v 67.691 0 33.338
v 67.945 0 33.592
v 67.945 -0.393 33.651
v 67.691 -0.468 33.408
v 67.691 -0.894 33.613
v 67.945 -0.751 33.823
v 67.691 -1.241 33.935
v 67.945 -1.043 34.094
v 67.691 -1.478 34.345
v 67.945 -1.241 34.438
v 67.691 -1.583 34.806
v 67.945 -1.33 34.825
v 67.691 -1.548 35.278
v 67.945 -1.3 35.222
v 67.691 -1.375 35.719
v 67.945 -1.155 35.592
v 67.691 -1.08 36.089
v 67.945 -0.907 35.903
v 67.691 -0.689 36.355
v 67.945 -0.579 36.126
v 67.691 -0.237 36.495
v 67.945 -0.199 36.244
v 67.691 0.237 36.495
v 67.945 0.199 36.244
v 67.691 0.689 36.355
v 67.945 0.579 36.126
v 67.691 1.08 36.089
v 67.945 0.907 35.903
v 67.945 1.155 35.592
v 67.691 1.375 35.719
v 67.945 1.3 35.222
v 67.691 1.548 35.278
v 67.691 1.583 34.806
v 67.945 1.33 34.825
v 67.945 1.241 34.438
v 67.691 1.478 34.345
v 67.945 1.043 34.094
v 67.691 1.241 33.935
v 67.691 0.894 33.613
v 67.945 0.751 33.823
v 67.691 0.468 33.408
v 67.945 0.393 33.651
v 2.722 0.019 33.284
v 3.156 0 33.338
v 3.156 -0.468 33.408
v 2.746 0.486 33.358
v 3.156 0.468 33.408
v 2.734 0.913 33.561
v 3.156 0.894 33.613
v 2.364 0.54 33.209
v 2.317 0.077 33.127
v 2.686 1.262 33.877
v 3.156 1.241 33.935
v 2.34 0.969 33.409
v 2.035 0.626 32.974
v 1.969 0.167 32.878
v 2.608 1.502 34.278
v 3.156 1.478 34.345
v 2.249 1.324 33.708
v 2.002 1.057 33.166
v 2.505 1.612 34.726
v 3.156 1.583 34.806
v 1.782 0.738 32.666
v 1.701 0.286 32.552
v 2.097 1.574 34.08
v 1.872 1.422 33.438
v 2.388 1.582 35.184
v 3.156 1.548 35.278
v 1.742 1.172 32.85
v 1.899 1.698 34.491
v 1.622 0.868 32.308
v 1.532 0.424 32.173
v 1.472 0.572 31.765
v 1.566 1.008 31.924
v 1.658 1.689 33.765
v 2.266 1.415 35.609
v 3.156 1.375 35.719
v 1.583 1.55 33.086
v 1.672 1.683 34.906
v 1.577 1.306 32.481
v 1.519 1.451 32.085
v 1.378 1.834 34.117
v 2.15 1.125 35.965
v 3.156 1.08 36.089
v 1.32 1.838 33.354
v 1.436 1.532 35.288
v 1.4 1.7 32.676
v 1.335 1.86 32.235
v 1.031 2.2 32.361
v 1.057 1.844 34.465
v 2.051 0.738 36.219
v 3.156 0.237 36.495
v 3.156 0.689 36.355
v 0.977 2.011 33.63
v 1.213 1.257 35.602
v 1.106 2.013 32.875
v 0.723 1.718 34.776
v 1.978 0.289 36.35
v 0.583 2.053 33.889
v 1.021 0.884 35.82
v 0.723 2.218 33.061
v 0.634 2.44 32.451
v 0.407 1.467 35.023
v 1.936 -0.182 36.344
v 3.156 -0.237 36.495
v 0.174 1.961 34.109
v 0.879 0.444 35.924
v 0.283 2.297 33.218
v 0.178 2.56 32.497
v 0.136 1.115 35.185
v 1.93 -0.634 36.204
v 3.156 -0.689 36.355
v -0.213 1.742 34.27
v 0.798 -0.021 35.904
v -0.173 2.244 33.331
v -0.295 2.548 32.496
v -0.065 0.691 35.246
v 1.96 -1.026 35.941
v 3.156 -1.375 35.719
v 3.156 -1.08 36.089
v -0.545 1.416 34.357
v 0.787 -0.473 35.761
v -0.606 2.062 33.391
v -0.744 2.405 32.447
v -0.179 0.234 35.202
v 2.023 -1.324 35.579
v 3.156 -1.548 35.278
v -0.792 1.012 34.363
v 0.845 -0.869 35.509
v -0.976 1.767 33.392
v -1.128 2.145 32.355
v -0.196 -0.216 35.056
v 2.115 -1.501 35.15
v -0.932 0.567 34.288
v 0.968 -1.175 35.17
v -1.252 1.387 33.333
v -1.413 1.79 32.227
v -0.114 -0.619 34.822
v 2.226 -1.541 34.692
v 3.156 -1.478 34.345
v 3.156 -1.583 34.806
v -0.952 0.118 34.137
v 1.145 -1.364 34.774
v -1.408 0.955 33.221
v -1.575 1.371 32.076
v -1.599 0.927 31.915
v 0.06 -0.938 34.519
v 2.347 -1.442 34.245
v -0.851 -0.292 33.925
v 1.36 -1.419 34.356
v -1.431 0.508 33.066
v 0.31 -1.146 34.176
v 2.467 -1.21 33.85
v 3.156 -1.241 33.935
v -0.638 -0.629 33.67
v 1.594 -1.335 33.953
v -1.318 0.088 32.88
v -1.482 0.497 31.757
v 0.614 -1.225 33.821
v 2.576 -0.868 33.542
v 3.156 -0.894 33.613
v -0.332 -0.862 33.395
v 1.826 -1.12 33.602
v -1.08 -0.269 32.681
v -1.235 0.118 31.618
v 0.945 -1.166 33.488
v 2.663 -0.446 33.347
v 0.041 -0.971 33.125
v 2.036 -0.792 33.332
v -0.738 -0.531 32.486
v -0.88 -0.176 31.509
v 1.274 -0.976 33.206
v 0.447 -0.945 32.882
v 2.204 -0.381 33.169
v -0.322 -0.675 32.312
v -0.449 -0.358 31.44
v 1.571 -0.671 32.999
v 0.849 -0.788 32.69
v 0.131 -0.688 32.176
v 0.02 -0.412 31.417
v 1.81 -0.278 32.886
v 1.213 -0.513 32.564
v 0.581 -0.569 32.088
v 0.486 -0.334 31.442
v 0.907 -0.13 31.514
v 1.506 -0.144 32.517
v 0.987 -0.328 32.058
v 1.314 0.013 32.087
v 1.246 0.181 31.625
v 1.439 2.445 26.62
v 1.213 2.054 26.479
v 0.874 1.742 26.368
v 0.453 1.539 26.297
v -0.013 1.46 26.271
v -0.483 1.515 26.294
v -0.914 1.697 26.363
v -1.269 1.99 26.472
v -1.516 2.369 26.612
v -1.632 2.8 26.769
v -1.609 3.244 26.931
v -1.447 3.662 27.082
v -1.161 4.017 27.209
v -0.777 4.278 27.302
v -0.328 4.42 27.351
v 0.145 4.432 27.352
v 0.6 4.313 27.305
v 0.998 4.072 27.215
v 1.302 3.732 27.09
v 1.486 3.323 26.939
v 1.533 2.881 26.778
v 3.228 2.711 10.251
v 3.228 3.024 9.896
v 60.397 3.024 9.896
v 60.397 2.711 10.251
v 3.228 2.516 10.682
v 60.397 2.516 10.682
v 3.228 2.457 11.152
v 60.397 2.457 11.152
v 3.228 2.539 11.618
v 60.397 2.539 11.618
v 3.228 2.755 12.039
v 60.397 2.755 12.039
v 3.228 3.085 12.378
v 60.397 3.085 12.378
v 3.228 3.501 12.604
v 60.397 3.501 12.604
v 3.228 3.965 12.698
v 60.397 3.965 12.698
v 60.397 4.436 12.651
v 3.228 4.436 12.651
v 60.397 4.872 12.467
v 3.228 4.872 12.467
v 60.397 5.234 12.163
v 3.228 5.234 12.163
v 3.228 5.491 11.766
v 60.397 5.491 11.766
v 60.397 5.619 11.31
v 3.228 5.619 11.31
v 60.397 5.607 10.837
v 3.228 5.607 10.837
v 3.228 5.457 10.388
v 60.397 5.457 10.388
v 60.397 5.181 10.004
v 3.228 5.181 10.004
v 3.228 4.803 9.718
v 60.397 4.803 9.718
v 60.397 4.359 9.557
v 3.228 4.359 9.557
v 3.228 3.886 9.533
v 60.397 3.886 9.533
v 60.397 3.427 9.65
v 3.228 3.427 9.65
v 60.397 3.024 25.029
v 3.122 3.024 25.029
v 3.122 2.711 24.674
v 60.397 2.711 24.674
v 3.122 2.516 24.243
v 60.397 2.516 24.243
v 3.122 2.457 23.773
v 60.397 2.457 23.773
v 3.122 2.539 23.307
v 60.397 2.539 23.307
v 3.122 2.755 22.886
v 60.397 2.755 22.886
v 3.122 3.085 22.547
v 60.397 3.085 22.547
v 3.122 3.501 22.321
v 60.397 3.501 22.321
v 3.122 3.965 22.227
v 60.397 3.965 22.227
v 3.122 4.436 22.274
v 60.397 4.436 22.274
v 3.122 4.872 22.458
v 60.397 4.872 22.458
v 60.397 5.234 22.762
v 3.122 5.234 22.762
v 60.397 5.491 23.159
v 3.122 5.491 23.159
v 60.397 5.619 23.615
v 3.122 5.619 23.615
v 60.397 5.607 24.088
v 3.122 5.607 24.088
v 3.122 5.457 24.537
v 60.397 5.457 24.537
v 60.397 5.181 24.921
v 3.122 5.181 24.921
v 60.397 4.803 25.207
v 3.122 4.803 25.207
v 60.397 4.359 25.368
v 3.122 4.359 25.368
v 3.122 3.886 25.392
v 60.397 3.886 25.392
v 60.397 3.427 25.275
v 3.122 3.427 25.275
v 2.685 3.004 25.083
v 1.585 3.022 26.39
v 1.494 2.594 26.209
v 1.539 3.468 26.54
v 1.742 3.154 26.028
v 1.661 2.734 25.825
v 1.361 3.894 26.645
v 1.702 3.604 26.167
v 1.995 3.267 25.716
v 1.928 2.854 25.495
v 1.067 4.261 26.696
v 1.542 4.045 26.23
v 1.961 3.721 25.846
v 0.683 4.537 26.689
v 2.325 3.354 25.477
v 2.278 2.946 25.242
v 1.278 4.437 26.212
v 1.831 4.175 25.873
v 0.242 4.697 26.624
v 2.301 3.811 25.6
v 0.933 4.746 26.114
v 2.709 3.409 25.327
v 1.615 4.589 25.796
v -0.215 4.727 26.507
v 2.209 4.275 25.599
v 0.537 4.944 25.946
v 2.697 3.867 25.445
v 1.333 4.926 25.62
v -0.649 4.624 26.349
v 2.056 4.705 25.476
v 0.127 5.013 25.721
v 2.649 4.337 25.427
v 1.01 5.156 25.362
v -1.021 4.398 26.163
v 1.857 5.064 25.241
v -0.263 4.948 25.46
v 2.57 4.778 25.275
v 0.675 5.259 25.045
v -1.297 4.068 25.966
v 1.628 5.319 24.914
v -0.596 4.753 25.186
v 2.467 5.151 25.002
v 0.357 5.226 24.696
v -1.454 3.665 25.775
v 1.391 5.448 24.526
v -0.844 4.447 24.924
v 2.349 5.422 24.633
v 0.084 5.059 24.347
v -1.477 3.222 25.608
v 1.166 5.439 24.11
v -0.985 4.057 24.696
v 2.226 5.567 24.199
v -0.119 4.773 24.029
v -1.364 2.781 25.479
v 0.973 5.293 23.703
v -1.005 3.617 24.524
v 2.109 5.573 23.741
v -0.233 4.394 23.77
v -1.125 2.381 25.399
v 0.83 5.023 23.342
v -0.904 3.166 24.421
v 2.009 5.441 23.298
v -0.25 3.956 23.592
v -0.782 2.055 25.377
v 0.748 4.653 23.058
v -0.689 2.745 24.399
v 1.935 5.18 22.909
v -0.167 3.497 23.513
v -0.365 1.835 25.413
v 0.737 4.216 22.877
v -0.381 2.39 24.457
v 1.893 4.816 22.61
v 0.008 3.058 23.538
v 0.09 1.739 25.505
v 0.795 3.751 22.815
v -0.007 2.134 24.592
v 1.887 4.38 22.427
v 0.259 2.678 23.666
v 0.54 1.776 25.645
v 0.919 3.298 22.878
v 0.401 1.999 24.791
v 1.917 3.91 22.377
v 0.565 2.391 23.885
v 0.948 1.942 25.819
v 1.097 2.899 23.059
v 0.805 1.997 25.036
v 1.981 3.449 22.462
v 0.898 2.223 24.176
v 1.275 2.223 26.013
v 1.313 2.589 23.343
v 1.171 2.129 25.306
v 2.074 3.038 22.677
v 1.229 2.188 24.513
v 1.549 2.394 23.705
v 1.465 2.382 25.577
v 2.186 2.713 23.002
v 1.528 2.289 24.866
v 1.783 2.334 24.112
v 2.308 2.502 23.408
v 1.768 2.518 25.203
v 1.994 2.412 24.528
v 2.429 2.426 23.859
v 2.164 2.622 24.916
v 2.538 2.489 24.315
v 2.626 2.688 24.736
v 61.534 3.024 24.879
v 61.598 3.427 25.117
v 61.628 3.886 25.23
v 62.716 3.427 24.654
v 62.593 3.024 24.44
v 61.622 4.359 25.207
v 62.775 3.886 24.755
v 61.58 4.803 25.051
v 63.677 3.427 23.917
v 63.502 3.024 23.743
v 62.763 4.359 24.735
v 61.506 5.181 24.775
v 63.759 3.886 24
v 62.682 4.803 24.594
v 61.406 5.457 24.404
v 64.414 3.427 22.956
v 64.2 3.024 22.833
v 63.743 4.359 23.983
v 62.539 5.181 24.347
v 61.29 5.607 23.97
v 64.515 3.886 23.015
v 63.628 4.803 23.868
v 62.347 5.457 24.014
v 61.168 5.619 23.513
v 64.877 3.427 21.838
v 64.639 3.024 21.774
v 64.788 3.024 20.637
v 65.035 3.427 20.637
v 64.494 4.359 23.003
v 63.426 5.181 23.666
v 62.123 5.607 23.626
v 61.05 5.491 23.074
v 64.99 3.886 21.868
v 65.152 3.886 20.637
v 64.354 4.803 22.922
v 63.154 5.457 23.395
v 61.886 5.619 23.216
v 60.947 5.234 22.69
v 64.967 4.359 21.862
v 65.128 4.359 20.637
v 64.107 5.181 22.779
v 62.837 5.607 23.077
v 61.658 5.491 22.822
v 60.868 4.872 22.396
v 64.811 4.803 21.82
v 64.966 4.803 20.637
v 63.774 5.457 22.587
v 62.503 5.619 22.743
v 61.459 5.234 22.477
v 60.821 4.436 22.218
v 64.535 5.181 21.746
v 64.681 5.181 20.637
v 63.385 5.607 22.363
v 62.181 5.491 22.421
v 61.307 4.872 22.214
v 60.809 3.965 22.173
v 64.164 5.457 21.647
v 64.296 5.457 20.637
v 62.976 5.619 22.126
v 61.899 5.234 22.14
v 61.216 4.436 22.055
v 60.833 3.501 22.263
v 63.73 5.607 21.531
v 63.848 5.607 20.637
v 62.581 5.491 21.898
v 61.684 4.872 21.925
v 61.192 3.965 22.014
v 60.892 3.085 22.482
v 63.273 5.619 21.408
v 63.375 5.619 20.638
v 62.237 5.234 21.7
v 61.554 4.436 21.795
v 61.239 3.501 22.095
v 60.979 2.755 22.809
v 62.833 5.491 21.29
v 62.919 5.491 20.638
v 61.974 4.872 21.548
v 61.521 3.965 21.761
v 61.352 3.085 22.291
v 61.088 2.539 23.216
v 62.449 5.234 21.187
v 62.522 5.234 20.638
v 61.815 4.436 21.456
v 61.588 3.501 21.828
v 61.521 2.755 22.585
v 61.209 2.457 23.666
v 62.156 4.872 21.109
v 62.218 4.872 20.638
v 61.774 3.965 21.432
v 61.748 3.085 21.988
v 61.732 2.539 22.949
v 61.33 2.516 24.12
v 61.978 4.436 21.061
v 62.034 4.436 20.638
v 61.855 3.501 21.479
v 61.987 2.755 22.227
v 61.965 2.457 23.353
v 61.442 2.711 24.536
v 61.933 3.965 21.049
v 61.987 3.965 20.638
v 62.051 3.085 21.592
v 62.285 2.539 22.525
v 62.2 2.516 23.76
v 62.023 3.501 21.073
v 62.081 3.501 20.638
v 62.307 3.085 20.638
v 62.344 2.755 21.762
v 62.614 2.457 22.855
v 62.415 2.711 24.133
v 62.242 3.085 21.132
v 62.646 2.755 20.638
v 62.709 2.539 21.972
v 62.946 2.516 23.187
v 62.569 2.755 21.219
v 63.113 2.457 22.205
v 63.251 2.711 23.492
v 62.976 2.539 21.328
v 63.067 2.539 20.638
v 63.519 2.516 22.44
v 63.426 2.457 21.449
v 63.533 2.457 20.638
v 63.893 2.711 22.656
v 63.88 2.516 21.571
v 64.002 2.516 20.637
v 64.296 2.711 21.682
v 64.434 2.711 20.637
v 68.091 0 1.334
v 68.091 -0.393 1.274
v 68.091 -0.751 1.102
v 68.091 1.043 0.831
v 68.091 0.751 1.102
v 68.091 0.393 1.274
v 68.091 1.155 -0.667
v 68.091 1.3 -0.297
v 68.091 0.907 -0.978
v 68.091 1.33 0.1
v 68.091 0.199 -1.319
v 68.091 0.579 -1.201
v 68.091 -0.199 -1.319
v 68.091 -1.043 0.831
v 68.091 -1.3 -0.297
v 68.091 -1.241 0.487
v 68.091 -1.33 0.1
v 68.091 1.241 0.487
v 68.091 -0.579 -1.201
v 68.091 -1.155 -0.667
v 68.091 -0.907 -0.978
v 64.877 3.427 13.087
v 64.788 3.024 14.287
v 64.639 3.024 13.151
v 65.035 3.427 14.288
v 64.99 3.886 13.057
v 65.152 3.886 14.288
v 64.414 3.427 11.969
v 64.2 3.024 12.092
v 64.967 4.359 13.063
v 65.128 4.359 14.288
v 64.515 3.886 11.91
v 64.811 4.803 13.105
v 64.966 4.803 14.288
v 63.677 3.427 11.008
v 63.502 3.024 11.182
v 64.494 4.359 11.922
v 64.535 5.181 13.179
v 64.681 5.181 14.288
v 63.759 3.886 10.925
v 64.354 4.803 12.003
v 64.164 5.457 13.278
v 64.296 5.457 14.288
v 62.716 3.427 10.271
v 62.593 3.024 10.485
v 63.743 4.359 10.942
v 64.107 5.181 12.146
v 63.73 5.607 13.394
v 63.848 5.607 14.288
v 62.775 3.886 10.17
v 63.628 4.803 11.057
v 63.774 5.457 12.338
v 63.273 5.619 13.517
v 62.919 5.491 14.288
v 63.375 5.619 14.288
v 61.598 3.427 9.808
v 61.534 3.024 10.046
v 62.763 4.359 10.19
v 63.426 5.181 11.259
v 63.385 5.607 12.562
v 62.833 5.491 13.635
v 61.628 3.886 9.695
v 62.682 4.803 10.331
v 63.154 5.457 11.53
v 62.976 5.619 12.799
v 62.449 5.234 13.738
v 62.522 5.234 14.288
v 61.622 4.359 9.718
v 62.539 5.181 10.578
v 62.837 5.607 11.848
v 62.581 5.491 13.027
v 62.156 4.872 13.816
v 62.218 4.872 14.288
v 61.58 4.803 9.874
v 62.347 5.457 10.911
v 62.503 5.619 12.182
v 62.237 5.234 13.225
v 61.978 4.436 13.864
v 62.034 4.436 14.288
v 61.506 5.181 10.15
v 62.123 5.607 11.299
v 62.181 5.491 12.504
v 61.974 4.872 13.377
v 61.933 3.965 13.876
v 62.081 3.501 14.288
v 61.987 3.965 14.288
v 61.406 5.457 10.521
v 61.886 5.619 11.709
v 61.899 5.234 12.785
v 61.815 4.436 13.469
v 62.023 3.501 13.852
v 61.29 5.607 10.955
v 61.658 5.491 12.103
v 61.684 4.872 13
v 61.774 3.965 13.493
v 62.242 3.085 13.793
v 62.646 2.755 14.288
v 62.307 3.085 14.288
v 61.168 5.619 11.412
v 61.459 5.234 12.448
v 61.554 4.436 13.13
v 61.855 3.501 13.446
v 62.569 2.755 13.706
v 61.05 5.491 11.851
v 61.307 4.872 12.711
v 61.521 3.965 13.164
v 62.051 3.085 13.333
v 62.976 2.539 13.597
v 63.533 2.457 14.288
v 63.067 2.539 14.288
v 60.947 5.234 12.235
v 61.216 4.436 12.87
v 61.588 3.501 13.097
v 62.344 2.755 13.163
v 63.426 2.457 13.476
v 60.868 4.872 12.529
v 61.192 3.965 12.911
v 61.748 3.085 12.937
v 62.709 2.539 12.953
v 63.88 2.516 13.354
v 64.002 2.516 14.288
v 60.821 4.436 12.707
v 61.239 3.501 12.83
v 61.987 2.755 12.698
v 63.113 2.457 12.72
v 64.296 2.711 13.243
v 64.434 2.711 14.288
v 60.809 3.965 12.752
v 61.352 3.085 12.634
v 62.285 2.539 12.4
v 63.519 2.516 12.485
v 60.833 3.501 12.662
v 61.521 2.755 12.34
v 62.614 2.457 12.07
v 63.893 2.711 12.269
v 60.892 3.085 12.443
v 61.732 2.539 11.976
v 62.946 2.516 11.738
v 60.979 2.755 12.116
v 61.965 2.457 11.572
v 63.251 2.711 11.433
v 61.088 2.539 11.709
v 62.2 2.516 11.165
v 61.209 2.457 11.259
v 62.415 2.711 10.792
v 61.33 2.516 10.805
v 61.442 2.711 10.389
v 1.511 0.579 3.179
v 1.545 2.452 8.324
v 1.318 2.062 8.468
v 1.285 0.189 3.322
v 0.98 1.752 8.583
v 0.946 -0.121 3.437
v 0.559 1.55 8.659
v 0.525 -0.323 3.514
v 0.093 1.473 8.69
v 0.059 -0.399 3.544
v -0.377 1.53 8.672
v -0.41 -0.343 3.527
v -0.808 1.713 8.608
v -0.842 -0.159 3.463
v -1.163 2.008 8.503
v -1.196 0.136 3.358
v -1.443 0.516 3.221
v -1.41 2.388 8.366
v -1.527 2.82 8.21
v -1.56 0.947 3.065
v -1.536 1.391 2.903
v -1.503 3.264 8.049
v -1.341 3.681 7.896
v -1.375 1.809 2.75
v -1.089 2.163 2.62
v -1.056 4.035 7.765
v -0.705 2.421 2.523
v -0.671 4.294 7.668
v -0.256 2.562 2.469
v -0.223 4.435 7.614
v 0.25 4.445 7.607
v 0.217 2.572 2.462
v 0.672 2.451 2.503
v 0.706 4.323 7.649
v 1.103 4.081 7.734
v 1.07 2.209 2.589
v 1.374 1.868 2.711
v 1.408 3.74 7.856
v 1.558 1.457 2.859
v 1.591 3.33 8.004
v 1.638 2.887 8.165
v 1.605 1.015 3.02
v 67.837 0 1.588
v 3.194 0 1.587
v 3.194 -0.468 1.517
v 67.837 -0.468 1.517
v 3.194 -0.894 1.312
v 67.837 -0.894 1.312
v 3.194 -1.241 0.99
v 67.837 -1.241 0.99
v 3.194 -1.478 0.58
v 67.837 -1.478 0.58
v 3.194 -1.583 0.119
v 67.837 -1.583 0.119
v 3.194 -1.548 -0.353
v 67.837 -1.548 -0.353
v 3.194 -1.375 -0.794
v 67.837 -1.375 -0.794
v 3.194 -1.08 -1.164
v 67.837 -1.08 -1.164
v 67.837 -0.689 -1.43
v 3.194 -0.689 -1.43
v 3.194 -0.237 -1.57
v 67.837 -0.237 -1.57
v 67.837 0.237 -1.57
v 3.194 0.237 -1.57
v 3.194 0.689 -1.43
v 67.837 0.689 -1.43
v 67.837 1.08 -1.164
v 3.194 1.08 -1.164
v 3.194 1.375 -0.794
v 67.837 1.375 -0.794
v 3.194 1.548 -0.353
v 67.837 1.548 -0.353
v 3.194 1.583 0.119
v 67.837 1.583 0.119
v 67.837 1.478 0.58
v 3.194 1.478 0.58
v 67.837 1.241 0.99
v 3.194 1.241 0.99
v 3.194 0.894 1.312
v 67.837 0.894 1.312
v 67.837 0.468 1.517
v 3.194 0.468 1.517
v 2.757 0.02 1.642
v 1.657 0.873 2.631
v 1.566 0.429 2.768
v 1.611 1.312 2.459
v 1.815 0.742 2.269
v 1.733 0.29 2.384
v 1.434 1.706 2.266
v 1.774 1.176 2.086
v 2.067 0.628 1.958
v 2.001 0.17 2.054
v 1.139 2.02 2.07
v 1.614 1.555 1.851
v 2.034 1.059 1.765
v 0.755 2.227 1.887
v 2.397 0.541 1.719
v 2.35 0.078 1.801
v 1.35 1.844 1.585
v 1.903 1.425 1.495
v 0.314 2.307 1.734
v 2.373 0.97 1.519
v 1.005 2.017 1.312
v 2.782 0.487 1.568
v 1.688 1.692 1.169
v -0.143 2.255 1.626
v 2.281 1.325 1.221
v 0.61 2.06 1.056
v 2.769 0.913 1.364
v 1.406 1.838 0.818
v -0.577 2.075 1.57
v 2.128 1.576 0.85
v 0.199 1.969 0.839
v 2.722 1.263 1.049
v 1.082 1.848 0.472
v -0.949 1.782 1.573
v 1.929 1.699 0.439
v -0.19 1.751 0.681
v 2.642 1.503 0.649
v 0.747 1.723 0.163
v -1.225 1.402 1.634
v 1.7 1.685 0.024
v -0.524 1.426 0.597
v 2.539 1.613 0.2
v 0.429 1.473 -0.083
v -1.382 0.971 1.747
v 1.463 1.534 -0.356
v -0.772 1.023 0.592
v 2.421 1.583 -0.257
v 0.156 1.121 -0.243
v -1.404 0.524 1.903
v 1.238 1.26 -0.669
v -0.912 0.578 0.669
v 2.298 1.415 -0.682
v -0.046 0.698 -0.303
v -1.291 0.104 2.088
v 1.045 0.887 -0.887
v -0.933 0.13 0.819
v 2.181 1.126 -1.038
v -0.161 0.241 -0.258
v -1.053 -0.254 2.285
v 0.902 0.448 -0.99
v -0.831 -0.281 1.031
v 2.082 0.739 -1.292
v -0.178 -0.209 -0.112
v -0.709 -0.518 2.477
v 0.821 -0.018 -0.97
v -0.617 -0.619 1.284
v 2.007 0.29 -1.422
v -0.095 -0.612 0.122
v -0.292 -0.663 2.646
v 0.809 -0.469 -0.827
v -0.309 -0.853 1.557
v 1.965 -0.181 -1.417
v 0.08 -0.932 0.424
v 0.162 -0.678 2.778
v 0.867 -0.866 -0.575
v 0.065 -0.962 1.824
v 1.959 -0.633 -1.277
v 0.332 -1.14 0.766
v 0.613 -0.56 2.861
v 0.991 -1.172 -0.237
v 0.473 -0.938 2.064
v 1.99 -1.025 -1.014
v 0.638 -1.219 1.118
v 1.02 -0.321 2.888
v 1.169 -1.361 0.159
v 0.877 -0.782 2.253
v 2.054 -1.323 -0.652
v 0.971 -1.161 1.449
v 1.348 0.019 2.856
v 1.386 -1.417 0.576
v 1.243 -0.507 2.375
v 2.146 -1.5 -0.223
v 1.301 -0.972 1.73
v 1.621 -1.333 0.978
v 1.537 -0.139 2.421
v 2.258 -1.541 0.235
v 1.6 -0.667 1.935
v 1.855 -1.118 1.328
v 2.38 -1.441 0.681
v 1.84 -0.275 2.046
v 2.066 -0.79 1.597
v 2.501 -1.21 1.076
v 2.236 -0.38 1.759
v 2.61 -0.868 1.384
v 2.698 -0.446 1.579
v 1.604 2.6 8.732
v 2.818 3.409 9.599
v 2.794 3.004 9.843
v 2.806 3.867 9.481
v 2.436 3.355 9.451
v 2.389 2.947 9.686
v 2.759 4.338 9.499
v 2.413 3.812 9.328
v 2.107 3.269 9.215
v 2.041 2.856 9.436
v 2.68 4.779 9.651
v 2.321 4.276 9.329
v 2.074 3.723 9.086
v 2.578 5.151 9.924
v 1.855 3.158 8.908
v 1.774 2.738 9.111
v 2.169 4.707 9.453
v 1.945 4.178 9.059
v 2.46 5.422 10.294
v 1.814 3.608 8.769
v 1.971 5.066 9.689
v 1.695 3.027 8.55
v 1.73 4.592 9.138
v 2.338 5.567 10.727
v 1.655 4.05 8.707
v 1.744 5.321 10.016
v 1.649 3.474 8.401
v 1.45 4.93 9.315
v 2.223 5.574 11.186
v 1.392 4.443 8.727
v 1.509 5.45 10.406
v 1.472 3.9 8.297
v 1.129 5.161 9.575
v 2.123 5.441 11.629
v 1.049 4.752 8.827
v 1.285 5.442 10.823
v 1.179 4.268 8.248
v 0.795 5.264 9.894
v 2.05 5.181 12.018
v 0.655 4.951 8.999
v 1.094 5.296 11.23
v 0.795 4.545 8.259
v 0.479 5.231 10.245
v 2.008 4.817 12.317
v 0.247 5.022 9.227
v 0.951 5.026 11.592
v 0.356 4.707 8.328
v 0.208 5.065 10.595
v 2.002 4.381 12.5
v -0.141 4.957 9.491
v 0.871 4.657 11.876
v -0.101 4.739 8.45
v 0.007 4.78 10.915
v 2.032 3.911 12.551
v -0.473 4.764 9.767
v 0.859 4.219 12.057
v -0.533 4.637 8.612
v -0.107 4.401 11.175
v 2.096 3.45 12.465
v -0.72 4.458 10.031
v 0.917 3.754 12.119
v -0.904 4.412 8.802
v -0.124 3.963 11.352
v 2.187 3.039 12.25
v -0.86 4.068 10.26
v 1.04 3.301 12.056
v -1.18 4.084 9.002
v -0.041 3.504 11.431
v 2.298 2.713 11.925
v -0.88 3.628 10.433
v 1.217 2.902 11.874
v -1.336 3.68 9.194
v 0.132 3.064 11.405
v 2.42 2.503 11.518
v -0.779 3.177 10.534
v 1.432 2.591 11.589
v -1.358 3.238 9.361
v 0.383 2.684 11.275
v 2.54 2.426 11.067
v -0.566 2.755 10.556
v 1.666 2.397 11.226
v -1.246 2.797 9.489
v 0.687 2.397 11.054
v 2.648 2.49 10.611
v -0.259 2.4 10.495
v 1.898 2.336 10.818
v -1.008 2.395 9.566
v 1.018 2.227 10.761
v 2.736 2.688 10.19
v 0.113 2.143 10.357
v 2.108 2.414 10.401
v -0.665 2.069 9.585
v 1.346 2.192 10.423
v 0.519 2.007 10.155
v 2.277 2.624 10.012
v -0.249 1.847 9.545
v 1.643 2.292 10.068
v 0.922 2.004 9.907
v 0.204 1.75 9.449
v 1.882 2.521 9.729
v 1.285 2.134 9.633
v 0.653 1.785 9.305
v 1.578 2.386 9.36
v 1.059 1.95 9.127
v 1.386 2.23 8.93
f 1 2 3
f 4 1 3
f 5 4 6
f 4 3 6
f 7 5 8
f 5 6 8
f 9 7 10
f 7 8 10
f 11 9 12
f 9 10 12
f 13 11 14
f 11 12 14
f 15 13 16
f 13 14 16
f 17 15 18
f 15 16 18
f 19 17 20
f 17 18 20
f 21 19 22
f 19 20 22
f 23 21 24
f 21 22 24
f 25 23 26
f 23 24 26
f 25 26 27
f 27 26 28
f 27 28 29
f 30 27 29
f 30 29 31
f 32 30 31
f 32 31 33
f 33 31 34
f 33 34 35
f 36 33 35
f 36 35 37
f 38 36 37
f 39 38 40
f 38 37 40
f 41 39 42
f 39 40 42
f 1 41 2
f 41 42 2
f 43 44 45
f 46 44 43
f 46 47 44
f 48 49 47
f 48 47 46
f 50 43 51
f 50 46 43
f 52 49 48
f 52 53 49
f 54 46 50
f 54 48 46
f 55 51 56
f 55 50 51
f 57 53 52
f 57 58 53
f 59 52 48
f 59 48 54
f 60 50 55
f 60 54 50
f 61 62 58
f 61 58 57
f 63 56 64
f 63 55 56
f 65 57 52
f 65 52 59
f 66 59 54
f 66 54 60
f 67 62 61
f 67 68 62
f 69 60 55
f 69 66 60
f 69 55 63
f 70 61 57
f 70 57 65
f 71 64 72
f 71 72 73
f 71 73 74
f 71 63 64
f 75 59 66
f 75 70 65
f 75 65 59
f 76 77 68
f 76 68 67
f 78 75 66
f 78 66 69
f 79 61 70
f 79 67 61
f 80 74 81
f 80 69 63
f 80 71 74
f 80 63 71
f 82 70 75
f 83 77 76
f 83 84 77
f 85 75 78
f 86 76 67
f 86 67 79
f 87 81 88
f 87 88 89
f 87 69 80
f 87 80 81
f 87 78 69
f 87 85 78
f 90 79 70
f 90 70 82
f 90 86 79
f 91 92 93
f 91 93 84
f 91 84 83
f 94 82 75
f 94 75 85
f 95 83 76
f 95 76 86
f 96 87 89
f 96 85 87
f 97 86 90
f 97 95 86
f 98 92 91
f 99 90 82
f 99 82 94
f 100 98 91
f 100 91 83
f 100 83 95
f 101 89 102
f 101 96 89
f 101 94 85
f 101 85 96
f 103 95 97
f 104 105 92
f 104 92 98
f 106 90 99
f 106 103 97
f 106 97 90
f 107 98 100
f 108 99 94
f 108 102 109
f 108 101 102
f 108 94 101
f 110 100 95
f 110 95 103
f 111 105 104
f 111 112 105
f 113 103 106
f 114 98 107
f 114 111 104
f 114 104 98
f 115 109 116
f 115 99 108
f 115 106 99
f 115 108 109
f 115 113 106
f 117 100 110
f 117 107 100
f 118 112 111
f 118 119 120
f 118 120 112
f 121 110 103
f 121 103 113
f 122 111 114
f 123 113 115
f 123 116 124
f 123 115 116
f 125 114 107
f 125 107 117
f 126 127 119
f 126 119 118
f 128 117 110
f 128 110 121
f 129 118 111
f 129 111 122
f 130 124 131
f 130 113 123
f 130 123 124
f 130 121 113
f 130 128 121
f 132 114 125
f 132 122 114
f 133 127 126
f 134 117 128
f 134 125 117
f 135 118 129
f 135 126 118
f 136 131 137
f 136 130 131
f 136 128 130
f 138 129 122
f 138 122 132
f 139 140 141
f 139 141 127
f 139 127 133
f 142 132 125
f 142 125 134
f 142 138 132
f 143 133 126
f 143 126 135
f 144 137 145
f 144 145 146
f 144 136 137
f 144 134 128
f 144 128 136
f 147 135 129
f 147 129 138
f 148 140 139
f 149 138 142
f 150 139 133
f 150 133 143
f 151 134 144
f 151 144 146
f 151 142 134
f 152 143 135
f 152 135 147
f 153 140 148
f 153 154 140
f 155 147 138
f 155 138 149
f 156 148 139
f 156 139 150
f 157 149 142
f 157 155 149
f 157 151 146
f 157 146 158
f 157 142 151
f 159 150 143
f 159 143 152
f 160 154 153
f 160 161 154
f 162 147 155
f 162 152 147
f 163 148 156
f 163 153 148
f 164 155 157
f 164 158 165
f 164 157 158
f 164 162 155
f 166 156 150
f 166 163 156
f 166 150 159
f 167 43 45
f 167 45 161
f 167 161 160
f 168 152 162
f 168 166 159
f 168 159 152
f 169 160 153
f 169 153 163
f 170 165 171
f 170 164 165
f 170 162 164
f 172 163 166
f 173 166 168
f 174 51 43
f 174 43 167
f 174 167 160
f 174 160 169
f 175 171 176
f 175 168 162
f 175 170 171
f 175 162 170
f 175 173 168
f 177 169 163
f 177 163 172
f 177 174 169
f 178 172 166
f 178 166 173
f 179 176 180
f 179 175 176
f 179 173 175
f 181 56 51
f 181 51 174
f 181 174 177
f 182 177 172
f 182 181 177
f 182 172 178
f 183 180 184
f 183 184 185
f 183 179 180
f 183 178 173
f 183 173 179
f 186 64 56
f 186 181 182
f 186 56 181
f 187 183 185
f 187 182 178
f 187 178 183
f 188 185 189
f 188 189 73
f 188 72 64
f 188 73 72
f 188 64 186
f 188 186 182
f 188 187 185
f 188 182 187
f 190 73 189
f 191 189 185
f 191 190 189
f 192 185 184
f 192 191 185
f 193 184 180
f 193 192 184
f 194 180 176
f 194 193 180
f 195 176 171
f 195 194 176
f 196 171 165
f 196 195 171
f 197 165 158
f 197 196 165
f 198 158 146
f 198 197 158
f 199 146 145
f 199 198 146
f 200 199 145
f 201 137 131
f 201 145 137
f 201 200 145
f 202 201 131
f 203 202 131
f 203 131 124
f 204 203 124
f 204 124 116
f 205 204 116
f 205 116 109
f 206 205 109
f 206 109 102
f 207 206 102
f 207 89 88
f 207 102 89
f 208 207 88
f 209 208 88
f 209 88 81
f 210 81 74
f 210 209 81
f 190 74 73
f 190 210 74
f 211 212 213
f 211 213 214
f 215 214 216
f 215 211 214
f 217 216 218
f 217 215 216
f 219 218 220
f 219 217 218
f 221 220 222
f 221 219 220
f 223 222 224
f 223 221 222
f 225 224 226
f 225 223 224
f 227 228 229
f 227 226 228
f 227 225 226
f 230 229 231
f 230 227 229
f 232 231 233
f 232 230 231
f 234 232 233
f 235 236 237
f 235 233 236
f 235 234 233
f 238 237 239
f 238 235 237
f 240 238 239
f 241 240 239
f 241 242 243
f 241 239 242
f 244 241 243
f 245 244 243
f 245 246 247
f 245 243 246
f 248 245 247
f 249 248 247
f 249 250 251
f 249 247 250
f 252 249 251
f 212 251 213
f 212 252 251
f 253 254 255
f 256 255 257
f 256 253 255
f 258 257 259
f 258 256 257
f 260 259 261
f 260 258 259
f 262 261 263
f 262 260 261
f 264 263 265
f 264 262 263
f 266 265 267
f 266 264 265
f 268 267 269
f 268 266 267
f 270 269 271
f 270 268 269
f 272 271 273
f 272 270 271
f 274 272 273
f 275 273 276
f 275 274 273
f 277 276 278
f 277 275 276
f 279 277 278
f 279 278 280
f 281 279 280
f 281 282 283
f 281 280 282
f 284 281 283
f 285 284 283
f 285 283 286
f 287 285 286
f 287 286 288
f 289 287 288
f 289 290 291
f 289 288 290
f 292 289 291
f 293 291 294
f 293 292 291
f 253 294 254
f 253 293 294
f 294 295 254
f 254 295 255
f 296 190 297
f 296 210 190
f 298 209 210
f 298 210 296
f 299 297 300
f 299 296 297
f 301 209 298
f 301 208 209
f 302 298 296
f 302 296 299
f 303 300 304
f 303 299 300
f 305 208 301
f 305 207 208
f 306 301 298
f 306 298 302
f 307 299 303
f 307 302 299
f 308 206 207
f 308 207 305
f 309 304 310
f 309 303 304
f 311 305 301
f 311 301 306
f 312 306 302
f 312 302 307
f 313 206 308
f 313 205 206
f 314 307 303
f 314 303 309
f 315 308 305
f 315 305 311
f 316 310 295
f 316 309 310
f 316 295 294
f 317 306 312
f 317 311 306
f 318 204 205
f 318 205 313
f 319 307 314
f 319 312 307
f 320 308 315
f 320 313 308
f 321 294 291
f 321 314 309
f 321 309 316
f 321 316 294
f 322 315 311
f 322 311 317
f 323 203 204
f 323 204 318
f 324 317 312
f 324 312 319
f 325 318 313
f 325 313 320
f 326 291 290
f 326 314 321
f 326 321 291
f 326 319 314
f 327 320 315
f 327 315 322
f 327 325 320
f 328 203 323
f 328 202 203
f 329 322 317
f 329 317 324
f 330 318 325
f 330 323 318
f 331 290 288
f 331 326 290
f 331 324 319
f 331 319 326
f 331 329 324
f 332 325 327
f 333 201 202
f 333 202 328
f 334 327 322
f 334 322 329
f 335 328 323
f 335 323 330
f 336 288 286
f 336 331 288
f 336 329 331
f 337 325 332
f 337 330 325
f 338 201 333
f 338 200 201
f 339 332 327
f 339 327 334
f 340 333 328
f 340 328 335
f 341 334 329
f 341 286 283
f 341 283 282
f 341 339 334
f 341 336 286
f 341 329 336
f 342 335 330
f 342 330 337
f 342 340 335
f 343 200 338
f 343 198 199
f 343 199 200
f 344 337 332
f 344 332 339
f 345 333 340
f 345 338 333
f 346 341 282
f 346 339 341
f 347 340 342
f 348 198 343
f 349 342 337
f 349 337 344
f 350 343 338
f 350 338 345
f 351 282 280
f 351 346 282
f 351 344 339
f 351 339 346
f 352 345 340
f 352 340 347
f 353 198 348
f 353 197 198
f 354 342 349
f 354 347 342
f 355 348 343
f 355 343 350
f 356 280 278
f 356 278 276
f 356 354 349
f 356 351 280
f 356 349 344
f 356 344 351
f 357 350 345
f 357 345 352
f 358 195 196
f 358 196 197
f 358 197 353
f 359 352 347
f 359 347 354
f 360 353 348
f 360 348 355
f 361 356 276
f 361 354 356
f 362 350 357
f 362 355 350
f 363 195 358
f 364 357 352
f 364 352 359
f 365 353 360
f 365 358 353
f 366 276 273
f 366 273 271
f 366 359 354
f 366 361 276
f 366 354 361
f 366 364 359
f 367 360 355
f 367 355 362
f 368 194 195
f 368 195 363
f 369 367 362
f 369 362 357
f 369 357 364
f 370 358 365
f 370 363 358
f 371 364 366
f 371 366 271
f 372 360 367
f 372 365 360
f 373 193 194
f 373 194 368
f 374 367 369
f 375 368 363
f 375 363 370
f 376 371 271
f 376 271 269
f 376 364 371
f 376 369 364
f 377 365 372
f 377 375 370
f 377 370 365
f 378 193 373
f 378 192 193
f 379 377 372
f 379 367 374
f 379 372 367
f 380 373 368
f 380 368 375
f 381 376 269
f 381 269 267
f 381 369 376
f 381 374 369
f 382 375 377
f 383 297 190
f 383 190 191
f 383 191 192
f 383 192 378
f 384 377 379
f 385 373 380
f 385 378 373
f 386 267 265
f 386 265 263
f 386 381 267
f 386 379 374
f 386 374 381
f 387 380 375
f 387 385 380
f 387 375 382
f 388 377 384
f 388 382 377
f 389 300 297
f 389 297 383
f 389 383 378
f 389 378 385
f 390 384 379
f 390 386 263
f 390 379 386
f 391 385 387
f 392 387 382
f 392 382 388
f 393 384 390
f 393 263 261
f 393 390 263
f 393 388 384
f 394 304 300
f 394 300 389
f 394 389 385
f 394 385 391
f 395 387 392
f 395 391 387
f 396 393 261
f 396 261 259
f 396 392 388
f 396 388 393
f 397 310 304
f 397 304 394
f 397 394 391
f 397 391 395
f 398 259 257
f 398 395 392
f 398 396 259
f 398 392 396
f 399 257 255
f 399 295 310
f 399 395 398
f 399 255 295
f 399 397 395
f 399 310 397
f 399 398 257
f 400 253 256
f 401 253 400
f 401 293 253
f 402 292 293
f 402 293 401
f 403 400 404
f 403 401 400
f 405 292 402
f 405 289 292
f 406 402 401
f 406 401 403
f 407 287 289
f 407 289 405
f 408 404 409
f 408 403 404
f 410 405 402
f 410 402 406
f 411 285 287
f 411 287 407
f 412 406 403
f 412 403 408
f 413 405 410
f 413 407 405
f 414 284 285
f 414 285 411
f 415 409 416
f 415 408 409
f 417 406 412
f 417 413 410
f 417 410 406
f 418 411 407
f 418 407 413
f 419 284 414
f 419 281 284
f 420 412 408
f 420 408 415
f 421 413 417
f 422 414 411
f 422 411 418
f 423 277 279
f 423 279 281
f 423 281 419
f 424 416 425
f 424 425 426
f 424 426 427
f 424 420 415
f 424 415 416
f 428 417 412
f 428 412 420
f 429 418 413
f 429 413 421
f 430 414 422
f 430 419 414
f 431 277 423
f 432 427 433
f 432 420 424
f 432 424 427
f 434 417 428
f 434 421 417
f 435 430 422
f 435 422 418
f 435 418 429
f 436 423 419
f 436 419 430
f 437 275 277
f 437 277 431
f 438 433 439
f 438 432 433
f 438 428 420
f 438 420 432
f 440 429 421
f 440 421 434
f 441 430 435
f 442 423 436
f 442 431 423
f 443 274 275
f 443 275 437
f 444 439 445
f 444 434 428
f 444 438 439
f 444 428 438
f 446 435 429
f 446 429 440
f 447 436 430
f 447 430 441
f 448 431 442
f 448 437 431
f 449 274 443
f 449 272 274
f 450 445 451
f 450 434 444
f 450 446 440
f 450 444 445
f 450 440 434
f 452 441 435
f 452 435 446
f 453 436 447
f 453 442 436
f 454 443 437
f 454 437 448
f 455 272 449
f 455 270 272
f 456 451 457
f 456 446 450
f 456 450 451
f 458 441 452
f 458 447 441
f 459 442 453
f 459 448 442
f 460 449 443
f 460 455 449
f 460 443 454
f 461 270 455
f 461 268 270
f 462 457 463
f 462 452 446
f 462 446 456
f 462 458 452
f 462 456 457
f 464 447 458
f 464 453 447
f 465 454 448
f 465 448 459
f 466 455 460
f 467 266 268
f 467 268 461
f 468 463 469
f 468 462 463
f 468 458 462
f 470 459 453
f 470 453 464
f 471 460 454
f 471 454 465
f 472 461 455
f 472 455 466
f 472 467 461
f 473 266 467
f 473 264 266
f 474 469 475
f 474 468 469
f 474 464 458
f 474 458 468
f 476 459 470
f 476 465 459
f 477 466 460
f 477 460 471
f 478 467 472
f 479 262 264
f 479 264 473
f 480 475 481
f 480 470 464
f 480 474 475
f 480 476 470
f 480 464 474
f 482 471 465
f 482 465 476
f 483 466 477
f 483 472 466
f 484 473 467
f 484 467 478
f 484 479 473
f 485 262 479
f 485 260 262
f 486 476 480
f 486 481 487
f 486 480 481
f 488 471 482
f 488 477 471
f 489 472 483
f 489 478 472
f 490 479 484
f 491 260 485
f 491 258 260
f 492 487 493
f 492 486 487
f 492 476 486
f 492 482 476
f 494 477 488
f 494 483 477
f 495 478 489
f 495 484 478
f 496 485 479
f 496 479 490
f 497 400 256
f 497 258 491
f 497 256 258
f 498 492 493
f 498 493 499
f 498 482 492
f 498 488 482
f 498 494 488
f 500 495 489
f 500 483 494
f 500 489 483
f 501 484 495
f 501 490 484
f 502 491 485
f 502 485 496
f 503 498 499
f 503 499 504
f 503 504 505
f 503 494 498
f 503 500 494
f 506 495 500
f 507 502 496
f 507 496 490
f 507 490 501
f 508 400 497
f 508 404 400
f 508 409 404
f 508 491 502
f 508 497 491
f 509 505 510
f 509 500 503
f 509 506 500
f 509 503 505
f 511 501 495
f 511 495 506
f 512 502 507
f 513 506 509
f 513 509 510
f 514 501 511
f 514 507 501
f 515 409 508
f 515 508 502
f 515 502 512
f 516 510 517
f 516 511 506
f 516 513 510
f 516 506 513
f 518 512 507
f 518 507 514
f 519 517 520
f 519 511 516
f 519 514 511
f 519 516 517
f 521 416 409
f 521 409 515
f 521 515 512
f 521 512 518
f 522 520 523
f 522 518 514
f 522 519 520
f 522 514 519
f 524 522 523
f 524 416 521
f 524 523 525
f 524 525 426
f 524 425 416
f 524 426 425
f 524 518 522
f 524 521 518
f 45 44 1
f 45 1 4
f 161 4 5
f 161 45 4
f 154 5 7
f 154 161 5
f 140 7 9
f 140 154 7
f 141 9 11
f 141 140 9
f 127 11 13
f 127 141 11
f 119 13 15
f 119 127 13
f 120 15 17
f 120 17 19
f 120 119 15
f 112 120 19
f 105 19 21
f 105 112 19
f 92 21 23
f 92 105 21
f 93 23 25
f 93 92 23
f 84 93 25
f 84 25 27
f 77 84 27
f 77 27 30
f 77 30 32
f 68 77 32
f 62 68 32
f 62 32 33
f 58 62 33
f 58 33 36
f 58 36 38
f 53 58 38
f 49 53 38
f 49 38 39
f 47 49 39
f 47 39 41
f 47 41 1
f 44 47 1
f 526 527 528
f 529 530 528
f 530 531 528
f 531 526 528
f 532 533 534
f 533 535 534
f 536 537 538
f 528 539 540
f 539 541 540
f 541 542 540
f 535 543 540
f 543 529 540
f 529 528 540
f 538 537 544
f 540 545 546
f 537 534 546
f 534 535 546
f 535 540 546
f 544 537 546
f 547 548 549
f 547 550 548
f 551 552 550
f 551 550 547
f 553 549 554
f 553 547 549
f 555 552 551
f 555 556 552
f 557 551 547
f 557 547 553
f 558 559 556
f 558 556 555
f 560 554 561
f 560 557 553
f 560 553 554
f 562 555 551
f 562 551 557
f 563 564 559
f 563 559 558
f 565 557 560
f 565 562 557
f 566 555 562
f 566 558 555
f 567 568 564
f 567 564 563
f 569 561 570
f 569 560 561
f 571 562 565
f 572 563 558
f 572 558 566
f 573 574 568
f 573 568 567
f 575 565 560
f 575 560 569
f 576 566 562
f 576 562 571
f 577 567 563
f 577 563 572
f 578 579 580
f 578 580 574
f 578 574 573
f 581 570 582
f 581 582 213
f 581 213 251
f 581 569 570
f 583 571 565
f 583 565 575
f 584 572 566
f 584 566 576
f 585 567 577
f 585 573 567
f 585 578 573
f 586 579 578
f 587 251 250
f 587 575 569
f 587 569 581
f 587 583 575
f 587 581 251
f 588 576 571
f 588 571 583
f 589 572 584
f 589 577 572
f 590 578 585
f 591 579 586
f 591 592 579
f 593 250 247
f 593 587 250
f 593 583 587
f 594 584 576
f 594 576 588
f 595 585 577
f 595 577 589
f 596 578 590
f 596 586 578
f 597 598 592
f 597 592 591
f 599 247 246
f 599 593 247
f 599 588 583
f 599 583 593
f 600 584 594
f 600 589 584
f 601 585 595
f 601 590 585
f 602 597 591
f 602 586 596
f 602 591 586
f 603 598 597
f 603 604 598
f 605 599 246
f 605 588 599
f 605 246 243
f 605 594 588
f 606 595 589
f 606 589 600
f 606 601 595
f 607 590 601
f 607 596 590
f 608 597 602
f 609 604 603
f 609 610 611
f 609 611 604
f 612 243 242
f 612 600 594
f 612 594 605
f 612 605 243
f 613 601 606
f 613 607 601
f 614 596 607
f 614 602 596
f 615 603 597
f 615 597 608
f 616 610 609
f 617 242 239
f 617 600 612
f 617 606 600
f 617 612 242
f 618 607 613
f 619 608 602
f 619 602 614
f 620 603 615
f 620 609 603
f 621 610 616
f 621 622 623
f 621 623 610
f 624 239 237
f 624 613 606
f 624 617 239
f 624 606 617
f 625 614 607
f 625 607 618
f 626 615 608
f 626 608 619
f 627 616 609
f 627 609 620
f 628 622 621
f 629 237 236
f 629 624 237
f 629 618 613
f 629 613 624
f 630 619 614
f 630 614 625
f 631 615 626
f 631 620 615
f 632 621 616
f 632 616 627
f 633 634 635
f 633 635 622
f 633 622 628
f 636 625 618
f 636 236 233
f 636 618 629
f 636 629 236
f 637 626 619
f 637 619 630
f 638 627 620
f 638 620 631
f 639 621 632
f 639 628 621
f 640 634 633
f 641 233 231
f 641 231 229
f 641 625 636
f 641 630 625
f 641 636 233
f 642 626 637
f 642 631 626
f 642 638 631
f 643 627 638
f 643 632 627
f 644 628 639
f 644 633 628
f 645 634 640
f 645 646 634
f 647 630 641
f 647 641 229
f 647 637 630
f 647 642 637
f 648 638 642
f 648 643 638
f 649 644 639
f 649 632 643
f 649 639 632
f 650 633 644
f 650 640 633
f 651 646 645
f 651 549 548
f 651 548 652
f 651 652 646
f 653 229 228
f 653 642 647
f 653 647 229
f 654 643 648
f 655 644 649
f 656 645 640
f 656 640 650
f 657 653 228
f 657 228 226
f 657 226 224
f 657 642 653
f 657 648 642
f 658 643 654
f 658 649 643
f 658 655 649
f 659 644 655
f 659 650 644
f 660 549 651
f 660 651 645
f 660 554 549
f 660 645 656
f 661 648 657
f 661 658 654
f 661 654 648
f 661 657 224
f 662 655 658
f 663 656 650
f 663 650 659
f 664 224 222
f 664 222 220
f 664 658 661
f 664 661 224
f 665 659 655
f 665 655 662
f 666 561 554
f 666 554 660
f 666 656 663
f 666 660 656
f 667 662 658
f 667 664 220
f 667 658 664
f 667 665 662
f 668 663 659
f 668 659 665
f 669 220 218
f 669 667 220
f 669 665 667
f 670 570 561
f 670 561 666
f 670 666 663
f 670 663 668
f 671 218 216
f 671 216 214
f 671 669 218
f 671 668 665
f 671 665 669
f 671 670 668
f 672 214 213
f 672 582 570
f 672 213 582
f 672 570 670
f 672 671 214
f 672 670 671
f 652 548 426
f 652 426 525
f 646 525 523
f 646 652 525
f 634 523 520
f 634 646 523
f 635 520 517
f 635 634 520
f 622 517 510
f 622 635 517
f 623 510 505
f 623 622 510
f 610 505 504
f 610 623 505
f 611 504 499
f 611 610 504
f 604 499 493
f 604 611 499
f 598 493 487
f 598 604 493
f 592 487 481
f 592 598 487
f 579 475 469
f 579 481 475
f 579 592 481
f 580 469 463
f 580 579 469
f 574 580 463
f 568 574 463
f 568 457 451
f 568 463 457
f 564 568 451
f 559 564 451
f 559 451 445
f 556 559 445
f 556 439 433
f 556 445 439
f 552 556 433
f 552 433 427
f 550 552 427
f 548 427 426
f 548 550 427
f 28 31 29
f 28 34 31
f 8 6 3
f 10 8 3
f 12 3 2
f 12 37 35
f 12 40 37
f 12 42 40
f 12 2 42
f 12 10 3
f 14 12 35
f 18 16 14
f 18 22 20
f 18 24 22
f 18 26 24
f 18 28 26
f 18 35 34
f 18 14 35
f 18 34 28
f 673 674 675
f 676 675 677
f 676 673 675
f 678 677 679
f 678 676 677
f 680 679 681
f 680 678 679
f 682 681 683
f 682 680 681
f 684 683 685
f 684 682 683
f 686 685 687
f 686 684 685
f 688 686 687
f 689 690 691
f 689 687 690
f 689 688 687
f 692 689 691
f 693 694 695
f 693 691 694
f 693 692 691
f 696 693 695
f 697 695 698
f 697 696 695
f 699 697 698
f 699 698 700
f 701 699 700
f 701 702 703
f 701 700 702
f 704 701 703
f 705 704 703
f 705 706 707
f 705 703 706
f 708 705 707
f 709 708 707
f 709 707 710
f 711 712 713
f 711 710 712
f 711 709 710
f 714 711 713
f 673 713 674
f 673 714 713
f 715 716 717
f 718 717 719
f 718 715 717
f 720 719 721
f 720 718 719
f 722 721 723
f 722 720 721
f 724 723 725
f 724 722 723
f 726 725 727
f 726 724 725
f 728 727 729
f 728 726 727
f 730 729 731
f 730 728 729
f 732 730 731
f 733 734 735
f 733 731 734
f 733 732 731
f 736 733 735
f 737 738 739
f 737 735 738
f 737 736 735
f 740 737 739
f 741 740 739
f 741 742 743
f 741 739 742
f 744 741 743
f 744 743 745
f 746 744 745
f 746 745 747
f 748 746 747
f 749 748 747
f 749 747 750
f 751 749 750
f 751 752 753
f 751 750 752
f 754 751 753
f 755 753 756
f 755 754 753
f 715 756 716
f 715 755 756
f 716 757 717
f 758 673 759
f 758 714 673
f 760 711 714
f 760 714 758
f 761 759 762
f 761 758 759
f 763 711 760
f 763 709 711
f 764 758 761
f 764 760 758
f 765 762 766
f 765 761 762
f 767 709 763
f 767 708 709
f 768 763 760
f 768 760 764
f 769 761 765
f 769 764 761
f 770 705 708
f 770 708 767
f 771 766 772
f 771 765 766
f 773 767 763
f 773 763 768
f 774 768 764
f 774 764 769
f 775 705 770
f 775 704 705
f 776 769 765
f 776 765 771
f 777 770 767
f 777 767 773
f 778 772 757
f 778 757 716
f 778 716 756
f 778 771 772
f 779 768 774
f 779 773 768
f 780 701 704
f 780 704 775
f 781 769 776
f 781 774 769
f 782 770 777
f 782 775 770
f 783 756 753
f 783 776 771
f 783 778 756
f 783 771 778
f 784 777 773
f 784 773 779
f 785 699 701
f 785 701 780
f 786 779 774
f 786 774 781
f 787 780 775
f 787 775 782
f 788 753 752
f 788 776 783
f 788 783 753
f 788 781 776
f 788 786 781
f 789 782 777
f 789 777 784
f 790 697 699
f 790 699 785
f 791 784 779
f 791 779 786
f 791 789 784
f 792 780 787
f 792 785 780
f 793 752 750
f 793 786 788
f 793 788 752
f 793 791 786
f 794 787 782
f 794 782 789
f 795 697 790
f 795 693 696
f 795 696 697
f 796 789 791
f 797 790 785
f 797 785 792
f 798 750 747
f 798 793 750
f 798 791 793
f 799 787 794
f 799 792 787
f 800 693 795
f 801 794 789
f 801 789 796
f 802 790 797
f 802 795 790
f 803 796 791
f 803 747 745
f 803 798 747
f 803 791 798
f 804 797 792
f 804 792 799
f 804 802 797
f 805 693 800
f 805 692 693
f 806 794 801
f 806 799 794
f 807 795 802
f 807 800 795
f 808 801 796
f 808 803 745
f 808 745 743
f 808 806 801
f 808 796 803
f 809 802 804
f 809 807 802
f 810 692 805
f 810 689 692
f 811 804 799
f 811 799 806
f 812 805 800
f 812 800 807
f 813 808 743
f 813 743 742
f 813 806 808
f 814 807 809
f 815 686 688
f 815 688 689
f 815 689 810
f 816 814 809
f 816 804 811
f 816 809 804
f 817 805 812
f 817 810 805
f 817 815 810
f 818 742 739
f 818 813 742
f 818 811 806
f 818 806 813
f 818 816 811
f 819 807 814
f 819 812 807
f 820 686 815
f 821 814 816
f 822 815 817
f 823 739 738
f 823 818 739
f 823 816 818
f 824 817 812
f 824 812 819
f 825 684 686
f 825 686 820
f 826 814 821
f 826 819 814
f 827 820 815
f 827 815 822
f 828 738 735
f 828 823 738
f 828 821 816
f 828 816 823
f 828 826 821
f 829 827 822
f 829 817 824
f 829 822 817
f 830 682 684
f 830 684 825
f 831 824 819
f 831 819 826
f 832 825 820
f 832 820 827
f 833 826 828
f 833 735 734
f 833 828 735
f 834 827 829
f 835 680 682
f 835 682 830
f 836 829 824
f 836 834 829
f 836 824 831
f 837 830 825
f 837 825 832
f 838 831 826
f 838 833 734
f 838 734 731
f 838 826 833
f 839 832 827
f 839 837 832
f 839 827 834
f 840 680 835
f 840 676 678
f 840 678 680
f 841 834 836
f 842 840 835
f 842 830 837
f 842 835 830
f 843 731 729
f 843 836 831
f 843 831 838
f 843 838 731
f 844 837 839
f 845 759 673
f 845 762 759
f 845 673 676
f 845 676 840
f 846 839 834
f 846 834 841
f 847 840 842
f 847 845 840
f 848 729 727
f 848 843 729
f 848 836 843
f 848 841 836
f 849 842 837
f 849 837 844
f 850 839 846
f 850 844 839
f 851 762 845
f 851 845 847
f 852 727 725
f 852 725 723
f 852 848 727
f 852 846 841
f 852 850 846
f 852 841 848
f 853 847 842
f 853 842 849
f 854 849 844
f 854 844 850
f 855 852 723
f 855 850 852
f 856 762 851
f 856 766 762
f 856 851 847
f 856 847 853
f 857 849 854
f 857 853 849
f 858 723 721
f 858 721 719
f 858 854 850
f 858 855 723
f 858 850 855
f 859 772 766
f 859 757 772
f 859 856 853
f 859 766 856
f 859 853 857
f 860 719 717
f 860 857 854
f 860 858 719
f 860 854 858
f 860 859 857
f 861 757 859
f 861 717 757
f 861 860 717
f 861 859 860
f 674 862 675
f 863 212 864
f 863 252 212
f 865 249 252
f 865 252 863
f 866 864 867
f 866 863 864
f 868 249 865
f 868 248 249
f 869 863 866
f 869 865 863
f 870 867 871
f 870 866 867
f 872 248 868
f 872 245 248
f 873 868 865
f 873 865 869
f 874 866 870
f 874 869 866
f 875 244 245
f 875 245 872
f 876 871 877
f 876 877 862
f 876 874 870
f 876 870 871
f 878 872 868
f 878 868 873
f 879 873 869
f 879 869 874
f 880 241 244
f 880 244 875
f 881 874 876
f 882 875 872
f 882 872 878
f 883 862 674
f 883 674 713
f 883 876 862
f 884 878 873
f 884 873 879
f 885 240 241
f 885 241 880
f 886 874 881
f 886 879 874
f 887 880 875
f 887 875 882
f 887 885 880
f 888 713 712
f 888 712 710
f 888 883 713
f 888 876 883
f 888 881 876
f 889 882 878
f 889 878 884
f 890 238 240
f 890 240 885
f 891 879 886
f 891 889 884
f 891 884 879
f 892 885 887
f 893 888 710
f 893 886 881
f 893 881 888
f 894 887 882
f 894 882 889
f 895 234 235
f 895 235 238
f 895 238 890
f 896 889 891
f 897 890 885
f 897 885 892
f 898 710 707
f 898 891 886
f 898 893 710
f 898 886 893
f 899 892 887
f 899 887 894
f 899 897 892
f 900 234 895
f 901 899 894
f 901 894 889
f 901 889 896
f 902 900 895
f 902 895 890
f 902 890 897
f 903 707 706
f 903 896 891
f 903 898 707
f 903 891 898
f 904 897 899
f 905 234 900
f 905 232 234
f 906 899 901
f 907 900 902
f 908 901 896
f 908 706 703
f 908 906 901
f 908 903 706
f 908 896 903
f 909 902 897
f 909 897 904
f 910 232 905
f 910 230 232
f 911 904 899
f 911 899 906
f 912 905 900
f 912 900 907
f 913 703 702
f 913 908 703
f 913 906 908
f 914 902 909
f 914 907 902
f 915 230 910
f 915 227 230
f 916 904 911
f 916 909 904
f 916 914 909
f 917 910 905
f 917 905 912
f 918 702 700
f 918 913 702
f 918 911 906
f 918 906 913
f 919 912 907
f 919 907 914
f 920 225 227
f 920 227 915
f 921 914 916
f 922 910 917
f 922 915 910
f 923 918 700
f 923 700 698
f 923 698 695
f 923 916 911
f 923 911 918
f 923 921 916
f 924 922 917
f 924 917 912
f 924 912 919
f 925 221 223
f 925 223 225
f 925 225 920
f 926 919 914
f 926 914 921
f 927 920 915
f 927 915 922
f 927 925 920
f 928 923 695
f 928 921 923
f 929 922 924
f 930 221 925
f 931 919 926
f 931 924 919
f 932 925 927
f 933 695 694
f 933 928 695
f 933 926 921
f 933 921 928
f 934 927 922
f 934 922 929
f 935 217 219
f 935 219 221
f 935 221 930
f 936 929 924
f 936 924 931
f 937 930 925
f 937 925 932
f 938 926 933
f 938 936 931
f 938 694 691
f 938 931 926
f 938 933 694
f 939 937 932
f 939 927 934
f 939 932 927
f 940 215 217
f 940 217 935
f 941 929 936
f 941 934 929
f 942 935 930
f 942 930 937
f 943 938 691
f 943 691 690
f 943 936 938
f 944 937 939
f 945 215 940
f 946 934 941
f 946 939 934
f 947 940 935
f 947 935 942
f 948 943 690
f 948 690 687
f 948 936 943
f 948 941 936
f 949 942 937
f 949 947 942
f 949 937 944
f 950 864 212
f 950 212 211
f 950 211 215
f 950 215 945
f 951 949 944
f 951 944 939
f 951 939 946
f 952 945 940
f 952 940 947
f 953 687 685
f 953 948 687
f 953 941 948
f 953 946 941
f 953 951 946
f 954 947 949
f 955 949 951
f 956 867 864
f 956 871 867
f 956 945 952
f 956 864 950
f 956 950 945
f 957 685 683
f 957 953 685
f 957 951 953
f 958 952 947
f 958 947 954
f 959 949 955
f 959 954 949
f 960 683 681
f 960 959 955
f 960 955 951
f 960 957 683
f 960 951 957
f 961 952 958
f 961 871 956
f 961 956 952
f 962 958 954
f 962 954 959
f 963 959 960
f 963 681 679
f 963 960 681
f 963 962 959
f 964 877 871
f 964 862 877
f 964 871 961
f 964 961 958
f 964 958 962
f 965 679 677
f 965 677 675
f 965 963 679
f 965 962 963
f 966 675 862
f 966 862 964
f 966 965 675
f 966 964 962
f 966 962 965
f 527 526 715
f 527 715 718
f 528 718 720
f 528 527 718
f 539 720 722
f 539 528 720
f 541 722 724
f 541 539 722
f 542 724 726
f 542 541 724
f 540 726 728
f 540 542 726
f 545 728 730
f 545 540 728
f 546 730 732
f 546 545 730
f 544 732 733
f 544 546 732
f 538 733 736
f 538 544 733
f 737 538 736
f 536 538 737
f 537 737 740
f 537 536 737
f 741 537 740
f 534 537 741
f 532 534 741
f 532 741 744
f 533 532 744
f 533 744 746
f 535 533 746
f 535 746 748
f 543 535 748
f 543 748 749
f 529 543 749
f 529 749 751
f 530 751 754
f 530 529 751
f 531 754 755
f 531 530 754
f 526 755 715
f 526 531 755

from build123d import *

# Parameters (mm, degrees)
SKETCH1_R     = 1.5875
CHAMFER1_SIZE = 0.254


with BuildPart() as part:
    # Sweep1: sweep along a curve in space
    with BuildLine() as sweep1_path:
        Line((3.194463605, 0, 0), (68.09132068, 0, 0))
        ThreePointArc((3.194463605, 0, 0), (0.942549693, 0.320361628, 0.880326891), (0.019522899, 1.092396461, 3.001813877))
        Line((0.019522899, 1.092396461, 3.001813877), (0.052986653, 2.964848217, 8.147154297))
        ThreePointArc((0.052986653, 2.964848217, 8.147154297), (0.989734174, 3.728303943, 10.245066615), (3.227927359, 4.043973468, 11.1125))
        Line((3.227927359, 4.043973468, 11.1125), (60.397272373, 4.043973468, 11.1125))
        ThreePointArc((60.397272373, 4.043973468, 11.1125), (62.642336404, 4.043973468, 12.04243597), (63.572272373, 4.043973468, 14.2875))
        Line((63.572272373, 4.043973468, 14.2875), (63.572272373, 4.043973468, 20.6375))
        ThreePointArc((63.572272373, 4.043973468, 20.6375), (62.642336404, 4.043973468, 22.88256403), (60.397272373, 4.043973468, 23.8125))
        Line((60.397272373, 4.043973468, 23.8125), (3.122191232, 4.043973468, 23.8125))
        ThreePointArc((3.122191232, 4.043973468, 23.8125), (0.87027732, 3.723611839, 24.692826891), (-0.052749474, 2.951577007, 26.814313877))
        Line((-0.052749474, 2.951577007, 26.814313877), (-0.019285721, 1.079125251, 31.959654297))
        ThreePointArc((-0.019285721, 1.079125251, 31.959654297), (0.9174618, 0.315669525, 34.057566615), (3.155654985, 0, 34.925))
        Line((3.155654985, 0, 34.925), (67.945, 0, 34.925))
    # Sketch1 → Sweep1 (sweep)
    with BuildSketch(Plane(origin=(67.945, 0, 0), x_dir=(0, 0, -1), z_dir=(1, 0, 0))):
        with Locations((-34.925, 0)):
            Circle(SKETCH1_R)
    sweep(path=sweep1_path.line)

    # Chamfer1
    chamfer1_edges = [part.edges().sort_by_distance(p)[0] for p in [
        (68.09132068, 0, -1.5875),
        (67.945, 0, 36.5125),
    ]]
    chamfer(chamfer1_edges, length=CHAMFER1_SIZE)


solid = part.part
